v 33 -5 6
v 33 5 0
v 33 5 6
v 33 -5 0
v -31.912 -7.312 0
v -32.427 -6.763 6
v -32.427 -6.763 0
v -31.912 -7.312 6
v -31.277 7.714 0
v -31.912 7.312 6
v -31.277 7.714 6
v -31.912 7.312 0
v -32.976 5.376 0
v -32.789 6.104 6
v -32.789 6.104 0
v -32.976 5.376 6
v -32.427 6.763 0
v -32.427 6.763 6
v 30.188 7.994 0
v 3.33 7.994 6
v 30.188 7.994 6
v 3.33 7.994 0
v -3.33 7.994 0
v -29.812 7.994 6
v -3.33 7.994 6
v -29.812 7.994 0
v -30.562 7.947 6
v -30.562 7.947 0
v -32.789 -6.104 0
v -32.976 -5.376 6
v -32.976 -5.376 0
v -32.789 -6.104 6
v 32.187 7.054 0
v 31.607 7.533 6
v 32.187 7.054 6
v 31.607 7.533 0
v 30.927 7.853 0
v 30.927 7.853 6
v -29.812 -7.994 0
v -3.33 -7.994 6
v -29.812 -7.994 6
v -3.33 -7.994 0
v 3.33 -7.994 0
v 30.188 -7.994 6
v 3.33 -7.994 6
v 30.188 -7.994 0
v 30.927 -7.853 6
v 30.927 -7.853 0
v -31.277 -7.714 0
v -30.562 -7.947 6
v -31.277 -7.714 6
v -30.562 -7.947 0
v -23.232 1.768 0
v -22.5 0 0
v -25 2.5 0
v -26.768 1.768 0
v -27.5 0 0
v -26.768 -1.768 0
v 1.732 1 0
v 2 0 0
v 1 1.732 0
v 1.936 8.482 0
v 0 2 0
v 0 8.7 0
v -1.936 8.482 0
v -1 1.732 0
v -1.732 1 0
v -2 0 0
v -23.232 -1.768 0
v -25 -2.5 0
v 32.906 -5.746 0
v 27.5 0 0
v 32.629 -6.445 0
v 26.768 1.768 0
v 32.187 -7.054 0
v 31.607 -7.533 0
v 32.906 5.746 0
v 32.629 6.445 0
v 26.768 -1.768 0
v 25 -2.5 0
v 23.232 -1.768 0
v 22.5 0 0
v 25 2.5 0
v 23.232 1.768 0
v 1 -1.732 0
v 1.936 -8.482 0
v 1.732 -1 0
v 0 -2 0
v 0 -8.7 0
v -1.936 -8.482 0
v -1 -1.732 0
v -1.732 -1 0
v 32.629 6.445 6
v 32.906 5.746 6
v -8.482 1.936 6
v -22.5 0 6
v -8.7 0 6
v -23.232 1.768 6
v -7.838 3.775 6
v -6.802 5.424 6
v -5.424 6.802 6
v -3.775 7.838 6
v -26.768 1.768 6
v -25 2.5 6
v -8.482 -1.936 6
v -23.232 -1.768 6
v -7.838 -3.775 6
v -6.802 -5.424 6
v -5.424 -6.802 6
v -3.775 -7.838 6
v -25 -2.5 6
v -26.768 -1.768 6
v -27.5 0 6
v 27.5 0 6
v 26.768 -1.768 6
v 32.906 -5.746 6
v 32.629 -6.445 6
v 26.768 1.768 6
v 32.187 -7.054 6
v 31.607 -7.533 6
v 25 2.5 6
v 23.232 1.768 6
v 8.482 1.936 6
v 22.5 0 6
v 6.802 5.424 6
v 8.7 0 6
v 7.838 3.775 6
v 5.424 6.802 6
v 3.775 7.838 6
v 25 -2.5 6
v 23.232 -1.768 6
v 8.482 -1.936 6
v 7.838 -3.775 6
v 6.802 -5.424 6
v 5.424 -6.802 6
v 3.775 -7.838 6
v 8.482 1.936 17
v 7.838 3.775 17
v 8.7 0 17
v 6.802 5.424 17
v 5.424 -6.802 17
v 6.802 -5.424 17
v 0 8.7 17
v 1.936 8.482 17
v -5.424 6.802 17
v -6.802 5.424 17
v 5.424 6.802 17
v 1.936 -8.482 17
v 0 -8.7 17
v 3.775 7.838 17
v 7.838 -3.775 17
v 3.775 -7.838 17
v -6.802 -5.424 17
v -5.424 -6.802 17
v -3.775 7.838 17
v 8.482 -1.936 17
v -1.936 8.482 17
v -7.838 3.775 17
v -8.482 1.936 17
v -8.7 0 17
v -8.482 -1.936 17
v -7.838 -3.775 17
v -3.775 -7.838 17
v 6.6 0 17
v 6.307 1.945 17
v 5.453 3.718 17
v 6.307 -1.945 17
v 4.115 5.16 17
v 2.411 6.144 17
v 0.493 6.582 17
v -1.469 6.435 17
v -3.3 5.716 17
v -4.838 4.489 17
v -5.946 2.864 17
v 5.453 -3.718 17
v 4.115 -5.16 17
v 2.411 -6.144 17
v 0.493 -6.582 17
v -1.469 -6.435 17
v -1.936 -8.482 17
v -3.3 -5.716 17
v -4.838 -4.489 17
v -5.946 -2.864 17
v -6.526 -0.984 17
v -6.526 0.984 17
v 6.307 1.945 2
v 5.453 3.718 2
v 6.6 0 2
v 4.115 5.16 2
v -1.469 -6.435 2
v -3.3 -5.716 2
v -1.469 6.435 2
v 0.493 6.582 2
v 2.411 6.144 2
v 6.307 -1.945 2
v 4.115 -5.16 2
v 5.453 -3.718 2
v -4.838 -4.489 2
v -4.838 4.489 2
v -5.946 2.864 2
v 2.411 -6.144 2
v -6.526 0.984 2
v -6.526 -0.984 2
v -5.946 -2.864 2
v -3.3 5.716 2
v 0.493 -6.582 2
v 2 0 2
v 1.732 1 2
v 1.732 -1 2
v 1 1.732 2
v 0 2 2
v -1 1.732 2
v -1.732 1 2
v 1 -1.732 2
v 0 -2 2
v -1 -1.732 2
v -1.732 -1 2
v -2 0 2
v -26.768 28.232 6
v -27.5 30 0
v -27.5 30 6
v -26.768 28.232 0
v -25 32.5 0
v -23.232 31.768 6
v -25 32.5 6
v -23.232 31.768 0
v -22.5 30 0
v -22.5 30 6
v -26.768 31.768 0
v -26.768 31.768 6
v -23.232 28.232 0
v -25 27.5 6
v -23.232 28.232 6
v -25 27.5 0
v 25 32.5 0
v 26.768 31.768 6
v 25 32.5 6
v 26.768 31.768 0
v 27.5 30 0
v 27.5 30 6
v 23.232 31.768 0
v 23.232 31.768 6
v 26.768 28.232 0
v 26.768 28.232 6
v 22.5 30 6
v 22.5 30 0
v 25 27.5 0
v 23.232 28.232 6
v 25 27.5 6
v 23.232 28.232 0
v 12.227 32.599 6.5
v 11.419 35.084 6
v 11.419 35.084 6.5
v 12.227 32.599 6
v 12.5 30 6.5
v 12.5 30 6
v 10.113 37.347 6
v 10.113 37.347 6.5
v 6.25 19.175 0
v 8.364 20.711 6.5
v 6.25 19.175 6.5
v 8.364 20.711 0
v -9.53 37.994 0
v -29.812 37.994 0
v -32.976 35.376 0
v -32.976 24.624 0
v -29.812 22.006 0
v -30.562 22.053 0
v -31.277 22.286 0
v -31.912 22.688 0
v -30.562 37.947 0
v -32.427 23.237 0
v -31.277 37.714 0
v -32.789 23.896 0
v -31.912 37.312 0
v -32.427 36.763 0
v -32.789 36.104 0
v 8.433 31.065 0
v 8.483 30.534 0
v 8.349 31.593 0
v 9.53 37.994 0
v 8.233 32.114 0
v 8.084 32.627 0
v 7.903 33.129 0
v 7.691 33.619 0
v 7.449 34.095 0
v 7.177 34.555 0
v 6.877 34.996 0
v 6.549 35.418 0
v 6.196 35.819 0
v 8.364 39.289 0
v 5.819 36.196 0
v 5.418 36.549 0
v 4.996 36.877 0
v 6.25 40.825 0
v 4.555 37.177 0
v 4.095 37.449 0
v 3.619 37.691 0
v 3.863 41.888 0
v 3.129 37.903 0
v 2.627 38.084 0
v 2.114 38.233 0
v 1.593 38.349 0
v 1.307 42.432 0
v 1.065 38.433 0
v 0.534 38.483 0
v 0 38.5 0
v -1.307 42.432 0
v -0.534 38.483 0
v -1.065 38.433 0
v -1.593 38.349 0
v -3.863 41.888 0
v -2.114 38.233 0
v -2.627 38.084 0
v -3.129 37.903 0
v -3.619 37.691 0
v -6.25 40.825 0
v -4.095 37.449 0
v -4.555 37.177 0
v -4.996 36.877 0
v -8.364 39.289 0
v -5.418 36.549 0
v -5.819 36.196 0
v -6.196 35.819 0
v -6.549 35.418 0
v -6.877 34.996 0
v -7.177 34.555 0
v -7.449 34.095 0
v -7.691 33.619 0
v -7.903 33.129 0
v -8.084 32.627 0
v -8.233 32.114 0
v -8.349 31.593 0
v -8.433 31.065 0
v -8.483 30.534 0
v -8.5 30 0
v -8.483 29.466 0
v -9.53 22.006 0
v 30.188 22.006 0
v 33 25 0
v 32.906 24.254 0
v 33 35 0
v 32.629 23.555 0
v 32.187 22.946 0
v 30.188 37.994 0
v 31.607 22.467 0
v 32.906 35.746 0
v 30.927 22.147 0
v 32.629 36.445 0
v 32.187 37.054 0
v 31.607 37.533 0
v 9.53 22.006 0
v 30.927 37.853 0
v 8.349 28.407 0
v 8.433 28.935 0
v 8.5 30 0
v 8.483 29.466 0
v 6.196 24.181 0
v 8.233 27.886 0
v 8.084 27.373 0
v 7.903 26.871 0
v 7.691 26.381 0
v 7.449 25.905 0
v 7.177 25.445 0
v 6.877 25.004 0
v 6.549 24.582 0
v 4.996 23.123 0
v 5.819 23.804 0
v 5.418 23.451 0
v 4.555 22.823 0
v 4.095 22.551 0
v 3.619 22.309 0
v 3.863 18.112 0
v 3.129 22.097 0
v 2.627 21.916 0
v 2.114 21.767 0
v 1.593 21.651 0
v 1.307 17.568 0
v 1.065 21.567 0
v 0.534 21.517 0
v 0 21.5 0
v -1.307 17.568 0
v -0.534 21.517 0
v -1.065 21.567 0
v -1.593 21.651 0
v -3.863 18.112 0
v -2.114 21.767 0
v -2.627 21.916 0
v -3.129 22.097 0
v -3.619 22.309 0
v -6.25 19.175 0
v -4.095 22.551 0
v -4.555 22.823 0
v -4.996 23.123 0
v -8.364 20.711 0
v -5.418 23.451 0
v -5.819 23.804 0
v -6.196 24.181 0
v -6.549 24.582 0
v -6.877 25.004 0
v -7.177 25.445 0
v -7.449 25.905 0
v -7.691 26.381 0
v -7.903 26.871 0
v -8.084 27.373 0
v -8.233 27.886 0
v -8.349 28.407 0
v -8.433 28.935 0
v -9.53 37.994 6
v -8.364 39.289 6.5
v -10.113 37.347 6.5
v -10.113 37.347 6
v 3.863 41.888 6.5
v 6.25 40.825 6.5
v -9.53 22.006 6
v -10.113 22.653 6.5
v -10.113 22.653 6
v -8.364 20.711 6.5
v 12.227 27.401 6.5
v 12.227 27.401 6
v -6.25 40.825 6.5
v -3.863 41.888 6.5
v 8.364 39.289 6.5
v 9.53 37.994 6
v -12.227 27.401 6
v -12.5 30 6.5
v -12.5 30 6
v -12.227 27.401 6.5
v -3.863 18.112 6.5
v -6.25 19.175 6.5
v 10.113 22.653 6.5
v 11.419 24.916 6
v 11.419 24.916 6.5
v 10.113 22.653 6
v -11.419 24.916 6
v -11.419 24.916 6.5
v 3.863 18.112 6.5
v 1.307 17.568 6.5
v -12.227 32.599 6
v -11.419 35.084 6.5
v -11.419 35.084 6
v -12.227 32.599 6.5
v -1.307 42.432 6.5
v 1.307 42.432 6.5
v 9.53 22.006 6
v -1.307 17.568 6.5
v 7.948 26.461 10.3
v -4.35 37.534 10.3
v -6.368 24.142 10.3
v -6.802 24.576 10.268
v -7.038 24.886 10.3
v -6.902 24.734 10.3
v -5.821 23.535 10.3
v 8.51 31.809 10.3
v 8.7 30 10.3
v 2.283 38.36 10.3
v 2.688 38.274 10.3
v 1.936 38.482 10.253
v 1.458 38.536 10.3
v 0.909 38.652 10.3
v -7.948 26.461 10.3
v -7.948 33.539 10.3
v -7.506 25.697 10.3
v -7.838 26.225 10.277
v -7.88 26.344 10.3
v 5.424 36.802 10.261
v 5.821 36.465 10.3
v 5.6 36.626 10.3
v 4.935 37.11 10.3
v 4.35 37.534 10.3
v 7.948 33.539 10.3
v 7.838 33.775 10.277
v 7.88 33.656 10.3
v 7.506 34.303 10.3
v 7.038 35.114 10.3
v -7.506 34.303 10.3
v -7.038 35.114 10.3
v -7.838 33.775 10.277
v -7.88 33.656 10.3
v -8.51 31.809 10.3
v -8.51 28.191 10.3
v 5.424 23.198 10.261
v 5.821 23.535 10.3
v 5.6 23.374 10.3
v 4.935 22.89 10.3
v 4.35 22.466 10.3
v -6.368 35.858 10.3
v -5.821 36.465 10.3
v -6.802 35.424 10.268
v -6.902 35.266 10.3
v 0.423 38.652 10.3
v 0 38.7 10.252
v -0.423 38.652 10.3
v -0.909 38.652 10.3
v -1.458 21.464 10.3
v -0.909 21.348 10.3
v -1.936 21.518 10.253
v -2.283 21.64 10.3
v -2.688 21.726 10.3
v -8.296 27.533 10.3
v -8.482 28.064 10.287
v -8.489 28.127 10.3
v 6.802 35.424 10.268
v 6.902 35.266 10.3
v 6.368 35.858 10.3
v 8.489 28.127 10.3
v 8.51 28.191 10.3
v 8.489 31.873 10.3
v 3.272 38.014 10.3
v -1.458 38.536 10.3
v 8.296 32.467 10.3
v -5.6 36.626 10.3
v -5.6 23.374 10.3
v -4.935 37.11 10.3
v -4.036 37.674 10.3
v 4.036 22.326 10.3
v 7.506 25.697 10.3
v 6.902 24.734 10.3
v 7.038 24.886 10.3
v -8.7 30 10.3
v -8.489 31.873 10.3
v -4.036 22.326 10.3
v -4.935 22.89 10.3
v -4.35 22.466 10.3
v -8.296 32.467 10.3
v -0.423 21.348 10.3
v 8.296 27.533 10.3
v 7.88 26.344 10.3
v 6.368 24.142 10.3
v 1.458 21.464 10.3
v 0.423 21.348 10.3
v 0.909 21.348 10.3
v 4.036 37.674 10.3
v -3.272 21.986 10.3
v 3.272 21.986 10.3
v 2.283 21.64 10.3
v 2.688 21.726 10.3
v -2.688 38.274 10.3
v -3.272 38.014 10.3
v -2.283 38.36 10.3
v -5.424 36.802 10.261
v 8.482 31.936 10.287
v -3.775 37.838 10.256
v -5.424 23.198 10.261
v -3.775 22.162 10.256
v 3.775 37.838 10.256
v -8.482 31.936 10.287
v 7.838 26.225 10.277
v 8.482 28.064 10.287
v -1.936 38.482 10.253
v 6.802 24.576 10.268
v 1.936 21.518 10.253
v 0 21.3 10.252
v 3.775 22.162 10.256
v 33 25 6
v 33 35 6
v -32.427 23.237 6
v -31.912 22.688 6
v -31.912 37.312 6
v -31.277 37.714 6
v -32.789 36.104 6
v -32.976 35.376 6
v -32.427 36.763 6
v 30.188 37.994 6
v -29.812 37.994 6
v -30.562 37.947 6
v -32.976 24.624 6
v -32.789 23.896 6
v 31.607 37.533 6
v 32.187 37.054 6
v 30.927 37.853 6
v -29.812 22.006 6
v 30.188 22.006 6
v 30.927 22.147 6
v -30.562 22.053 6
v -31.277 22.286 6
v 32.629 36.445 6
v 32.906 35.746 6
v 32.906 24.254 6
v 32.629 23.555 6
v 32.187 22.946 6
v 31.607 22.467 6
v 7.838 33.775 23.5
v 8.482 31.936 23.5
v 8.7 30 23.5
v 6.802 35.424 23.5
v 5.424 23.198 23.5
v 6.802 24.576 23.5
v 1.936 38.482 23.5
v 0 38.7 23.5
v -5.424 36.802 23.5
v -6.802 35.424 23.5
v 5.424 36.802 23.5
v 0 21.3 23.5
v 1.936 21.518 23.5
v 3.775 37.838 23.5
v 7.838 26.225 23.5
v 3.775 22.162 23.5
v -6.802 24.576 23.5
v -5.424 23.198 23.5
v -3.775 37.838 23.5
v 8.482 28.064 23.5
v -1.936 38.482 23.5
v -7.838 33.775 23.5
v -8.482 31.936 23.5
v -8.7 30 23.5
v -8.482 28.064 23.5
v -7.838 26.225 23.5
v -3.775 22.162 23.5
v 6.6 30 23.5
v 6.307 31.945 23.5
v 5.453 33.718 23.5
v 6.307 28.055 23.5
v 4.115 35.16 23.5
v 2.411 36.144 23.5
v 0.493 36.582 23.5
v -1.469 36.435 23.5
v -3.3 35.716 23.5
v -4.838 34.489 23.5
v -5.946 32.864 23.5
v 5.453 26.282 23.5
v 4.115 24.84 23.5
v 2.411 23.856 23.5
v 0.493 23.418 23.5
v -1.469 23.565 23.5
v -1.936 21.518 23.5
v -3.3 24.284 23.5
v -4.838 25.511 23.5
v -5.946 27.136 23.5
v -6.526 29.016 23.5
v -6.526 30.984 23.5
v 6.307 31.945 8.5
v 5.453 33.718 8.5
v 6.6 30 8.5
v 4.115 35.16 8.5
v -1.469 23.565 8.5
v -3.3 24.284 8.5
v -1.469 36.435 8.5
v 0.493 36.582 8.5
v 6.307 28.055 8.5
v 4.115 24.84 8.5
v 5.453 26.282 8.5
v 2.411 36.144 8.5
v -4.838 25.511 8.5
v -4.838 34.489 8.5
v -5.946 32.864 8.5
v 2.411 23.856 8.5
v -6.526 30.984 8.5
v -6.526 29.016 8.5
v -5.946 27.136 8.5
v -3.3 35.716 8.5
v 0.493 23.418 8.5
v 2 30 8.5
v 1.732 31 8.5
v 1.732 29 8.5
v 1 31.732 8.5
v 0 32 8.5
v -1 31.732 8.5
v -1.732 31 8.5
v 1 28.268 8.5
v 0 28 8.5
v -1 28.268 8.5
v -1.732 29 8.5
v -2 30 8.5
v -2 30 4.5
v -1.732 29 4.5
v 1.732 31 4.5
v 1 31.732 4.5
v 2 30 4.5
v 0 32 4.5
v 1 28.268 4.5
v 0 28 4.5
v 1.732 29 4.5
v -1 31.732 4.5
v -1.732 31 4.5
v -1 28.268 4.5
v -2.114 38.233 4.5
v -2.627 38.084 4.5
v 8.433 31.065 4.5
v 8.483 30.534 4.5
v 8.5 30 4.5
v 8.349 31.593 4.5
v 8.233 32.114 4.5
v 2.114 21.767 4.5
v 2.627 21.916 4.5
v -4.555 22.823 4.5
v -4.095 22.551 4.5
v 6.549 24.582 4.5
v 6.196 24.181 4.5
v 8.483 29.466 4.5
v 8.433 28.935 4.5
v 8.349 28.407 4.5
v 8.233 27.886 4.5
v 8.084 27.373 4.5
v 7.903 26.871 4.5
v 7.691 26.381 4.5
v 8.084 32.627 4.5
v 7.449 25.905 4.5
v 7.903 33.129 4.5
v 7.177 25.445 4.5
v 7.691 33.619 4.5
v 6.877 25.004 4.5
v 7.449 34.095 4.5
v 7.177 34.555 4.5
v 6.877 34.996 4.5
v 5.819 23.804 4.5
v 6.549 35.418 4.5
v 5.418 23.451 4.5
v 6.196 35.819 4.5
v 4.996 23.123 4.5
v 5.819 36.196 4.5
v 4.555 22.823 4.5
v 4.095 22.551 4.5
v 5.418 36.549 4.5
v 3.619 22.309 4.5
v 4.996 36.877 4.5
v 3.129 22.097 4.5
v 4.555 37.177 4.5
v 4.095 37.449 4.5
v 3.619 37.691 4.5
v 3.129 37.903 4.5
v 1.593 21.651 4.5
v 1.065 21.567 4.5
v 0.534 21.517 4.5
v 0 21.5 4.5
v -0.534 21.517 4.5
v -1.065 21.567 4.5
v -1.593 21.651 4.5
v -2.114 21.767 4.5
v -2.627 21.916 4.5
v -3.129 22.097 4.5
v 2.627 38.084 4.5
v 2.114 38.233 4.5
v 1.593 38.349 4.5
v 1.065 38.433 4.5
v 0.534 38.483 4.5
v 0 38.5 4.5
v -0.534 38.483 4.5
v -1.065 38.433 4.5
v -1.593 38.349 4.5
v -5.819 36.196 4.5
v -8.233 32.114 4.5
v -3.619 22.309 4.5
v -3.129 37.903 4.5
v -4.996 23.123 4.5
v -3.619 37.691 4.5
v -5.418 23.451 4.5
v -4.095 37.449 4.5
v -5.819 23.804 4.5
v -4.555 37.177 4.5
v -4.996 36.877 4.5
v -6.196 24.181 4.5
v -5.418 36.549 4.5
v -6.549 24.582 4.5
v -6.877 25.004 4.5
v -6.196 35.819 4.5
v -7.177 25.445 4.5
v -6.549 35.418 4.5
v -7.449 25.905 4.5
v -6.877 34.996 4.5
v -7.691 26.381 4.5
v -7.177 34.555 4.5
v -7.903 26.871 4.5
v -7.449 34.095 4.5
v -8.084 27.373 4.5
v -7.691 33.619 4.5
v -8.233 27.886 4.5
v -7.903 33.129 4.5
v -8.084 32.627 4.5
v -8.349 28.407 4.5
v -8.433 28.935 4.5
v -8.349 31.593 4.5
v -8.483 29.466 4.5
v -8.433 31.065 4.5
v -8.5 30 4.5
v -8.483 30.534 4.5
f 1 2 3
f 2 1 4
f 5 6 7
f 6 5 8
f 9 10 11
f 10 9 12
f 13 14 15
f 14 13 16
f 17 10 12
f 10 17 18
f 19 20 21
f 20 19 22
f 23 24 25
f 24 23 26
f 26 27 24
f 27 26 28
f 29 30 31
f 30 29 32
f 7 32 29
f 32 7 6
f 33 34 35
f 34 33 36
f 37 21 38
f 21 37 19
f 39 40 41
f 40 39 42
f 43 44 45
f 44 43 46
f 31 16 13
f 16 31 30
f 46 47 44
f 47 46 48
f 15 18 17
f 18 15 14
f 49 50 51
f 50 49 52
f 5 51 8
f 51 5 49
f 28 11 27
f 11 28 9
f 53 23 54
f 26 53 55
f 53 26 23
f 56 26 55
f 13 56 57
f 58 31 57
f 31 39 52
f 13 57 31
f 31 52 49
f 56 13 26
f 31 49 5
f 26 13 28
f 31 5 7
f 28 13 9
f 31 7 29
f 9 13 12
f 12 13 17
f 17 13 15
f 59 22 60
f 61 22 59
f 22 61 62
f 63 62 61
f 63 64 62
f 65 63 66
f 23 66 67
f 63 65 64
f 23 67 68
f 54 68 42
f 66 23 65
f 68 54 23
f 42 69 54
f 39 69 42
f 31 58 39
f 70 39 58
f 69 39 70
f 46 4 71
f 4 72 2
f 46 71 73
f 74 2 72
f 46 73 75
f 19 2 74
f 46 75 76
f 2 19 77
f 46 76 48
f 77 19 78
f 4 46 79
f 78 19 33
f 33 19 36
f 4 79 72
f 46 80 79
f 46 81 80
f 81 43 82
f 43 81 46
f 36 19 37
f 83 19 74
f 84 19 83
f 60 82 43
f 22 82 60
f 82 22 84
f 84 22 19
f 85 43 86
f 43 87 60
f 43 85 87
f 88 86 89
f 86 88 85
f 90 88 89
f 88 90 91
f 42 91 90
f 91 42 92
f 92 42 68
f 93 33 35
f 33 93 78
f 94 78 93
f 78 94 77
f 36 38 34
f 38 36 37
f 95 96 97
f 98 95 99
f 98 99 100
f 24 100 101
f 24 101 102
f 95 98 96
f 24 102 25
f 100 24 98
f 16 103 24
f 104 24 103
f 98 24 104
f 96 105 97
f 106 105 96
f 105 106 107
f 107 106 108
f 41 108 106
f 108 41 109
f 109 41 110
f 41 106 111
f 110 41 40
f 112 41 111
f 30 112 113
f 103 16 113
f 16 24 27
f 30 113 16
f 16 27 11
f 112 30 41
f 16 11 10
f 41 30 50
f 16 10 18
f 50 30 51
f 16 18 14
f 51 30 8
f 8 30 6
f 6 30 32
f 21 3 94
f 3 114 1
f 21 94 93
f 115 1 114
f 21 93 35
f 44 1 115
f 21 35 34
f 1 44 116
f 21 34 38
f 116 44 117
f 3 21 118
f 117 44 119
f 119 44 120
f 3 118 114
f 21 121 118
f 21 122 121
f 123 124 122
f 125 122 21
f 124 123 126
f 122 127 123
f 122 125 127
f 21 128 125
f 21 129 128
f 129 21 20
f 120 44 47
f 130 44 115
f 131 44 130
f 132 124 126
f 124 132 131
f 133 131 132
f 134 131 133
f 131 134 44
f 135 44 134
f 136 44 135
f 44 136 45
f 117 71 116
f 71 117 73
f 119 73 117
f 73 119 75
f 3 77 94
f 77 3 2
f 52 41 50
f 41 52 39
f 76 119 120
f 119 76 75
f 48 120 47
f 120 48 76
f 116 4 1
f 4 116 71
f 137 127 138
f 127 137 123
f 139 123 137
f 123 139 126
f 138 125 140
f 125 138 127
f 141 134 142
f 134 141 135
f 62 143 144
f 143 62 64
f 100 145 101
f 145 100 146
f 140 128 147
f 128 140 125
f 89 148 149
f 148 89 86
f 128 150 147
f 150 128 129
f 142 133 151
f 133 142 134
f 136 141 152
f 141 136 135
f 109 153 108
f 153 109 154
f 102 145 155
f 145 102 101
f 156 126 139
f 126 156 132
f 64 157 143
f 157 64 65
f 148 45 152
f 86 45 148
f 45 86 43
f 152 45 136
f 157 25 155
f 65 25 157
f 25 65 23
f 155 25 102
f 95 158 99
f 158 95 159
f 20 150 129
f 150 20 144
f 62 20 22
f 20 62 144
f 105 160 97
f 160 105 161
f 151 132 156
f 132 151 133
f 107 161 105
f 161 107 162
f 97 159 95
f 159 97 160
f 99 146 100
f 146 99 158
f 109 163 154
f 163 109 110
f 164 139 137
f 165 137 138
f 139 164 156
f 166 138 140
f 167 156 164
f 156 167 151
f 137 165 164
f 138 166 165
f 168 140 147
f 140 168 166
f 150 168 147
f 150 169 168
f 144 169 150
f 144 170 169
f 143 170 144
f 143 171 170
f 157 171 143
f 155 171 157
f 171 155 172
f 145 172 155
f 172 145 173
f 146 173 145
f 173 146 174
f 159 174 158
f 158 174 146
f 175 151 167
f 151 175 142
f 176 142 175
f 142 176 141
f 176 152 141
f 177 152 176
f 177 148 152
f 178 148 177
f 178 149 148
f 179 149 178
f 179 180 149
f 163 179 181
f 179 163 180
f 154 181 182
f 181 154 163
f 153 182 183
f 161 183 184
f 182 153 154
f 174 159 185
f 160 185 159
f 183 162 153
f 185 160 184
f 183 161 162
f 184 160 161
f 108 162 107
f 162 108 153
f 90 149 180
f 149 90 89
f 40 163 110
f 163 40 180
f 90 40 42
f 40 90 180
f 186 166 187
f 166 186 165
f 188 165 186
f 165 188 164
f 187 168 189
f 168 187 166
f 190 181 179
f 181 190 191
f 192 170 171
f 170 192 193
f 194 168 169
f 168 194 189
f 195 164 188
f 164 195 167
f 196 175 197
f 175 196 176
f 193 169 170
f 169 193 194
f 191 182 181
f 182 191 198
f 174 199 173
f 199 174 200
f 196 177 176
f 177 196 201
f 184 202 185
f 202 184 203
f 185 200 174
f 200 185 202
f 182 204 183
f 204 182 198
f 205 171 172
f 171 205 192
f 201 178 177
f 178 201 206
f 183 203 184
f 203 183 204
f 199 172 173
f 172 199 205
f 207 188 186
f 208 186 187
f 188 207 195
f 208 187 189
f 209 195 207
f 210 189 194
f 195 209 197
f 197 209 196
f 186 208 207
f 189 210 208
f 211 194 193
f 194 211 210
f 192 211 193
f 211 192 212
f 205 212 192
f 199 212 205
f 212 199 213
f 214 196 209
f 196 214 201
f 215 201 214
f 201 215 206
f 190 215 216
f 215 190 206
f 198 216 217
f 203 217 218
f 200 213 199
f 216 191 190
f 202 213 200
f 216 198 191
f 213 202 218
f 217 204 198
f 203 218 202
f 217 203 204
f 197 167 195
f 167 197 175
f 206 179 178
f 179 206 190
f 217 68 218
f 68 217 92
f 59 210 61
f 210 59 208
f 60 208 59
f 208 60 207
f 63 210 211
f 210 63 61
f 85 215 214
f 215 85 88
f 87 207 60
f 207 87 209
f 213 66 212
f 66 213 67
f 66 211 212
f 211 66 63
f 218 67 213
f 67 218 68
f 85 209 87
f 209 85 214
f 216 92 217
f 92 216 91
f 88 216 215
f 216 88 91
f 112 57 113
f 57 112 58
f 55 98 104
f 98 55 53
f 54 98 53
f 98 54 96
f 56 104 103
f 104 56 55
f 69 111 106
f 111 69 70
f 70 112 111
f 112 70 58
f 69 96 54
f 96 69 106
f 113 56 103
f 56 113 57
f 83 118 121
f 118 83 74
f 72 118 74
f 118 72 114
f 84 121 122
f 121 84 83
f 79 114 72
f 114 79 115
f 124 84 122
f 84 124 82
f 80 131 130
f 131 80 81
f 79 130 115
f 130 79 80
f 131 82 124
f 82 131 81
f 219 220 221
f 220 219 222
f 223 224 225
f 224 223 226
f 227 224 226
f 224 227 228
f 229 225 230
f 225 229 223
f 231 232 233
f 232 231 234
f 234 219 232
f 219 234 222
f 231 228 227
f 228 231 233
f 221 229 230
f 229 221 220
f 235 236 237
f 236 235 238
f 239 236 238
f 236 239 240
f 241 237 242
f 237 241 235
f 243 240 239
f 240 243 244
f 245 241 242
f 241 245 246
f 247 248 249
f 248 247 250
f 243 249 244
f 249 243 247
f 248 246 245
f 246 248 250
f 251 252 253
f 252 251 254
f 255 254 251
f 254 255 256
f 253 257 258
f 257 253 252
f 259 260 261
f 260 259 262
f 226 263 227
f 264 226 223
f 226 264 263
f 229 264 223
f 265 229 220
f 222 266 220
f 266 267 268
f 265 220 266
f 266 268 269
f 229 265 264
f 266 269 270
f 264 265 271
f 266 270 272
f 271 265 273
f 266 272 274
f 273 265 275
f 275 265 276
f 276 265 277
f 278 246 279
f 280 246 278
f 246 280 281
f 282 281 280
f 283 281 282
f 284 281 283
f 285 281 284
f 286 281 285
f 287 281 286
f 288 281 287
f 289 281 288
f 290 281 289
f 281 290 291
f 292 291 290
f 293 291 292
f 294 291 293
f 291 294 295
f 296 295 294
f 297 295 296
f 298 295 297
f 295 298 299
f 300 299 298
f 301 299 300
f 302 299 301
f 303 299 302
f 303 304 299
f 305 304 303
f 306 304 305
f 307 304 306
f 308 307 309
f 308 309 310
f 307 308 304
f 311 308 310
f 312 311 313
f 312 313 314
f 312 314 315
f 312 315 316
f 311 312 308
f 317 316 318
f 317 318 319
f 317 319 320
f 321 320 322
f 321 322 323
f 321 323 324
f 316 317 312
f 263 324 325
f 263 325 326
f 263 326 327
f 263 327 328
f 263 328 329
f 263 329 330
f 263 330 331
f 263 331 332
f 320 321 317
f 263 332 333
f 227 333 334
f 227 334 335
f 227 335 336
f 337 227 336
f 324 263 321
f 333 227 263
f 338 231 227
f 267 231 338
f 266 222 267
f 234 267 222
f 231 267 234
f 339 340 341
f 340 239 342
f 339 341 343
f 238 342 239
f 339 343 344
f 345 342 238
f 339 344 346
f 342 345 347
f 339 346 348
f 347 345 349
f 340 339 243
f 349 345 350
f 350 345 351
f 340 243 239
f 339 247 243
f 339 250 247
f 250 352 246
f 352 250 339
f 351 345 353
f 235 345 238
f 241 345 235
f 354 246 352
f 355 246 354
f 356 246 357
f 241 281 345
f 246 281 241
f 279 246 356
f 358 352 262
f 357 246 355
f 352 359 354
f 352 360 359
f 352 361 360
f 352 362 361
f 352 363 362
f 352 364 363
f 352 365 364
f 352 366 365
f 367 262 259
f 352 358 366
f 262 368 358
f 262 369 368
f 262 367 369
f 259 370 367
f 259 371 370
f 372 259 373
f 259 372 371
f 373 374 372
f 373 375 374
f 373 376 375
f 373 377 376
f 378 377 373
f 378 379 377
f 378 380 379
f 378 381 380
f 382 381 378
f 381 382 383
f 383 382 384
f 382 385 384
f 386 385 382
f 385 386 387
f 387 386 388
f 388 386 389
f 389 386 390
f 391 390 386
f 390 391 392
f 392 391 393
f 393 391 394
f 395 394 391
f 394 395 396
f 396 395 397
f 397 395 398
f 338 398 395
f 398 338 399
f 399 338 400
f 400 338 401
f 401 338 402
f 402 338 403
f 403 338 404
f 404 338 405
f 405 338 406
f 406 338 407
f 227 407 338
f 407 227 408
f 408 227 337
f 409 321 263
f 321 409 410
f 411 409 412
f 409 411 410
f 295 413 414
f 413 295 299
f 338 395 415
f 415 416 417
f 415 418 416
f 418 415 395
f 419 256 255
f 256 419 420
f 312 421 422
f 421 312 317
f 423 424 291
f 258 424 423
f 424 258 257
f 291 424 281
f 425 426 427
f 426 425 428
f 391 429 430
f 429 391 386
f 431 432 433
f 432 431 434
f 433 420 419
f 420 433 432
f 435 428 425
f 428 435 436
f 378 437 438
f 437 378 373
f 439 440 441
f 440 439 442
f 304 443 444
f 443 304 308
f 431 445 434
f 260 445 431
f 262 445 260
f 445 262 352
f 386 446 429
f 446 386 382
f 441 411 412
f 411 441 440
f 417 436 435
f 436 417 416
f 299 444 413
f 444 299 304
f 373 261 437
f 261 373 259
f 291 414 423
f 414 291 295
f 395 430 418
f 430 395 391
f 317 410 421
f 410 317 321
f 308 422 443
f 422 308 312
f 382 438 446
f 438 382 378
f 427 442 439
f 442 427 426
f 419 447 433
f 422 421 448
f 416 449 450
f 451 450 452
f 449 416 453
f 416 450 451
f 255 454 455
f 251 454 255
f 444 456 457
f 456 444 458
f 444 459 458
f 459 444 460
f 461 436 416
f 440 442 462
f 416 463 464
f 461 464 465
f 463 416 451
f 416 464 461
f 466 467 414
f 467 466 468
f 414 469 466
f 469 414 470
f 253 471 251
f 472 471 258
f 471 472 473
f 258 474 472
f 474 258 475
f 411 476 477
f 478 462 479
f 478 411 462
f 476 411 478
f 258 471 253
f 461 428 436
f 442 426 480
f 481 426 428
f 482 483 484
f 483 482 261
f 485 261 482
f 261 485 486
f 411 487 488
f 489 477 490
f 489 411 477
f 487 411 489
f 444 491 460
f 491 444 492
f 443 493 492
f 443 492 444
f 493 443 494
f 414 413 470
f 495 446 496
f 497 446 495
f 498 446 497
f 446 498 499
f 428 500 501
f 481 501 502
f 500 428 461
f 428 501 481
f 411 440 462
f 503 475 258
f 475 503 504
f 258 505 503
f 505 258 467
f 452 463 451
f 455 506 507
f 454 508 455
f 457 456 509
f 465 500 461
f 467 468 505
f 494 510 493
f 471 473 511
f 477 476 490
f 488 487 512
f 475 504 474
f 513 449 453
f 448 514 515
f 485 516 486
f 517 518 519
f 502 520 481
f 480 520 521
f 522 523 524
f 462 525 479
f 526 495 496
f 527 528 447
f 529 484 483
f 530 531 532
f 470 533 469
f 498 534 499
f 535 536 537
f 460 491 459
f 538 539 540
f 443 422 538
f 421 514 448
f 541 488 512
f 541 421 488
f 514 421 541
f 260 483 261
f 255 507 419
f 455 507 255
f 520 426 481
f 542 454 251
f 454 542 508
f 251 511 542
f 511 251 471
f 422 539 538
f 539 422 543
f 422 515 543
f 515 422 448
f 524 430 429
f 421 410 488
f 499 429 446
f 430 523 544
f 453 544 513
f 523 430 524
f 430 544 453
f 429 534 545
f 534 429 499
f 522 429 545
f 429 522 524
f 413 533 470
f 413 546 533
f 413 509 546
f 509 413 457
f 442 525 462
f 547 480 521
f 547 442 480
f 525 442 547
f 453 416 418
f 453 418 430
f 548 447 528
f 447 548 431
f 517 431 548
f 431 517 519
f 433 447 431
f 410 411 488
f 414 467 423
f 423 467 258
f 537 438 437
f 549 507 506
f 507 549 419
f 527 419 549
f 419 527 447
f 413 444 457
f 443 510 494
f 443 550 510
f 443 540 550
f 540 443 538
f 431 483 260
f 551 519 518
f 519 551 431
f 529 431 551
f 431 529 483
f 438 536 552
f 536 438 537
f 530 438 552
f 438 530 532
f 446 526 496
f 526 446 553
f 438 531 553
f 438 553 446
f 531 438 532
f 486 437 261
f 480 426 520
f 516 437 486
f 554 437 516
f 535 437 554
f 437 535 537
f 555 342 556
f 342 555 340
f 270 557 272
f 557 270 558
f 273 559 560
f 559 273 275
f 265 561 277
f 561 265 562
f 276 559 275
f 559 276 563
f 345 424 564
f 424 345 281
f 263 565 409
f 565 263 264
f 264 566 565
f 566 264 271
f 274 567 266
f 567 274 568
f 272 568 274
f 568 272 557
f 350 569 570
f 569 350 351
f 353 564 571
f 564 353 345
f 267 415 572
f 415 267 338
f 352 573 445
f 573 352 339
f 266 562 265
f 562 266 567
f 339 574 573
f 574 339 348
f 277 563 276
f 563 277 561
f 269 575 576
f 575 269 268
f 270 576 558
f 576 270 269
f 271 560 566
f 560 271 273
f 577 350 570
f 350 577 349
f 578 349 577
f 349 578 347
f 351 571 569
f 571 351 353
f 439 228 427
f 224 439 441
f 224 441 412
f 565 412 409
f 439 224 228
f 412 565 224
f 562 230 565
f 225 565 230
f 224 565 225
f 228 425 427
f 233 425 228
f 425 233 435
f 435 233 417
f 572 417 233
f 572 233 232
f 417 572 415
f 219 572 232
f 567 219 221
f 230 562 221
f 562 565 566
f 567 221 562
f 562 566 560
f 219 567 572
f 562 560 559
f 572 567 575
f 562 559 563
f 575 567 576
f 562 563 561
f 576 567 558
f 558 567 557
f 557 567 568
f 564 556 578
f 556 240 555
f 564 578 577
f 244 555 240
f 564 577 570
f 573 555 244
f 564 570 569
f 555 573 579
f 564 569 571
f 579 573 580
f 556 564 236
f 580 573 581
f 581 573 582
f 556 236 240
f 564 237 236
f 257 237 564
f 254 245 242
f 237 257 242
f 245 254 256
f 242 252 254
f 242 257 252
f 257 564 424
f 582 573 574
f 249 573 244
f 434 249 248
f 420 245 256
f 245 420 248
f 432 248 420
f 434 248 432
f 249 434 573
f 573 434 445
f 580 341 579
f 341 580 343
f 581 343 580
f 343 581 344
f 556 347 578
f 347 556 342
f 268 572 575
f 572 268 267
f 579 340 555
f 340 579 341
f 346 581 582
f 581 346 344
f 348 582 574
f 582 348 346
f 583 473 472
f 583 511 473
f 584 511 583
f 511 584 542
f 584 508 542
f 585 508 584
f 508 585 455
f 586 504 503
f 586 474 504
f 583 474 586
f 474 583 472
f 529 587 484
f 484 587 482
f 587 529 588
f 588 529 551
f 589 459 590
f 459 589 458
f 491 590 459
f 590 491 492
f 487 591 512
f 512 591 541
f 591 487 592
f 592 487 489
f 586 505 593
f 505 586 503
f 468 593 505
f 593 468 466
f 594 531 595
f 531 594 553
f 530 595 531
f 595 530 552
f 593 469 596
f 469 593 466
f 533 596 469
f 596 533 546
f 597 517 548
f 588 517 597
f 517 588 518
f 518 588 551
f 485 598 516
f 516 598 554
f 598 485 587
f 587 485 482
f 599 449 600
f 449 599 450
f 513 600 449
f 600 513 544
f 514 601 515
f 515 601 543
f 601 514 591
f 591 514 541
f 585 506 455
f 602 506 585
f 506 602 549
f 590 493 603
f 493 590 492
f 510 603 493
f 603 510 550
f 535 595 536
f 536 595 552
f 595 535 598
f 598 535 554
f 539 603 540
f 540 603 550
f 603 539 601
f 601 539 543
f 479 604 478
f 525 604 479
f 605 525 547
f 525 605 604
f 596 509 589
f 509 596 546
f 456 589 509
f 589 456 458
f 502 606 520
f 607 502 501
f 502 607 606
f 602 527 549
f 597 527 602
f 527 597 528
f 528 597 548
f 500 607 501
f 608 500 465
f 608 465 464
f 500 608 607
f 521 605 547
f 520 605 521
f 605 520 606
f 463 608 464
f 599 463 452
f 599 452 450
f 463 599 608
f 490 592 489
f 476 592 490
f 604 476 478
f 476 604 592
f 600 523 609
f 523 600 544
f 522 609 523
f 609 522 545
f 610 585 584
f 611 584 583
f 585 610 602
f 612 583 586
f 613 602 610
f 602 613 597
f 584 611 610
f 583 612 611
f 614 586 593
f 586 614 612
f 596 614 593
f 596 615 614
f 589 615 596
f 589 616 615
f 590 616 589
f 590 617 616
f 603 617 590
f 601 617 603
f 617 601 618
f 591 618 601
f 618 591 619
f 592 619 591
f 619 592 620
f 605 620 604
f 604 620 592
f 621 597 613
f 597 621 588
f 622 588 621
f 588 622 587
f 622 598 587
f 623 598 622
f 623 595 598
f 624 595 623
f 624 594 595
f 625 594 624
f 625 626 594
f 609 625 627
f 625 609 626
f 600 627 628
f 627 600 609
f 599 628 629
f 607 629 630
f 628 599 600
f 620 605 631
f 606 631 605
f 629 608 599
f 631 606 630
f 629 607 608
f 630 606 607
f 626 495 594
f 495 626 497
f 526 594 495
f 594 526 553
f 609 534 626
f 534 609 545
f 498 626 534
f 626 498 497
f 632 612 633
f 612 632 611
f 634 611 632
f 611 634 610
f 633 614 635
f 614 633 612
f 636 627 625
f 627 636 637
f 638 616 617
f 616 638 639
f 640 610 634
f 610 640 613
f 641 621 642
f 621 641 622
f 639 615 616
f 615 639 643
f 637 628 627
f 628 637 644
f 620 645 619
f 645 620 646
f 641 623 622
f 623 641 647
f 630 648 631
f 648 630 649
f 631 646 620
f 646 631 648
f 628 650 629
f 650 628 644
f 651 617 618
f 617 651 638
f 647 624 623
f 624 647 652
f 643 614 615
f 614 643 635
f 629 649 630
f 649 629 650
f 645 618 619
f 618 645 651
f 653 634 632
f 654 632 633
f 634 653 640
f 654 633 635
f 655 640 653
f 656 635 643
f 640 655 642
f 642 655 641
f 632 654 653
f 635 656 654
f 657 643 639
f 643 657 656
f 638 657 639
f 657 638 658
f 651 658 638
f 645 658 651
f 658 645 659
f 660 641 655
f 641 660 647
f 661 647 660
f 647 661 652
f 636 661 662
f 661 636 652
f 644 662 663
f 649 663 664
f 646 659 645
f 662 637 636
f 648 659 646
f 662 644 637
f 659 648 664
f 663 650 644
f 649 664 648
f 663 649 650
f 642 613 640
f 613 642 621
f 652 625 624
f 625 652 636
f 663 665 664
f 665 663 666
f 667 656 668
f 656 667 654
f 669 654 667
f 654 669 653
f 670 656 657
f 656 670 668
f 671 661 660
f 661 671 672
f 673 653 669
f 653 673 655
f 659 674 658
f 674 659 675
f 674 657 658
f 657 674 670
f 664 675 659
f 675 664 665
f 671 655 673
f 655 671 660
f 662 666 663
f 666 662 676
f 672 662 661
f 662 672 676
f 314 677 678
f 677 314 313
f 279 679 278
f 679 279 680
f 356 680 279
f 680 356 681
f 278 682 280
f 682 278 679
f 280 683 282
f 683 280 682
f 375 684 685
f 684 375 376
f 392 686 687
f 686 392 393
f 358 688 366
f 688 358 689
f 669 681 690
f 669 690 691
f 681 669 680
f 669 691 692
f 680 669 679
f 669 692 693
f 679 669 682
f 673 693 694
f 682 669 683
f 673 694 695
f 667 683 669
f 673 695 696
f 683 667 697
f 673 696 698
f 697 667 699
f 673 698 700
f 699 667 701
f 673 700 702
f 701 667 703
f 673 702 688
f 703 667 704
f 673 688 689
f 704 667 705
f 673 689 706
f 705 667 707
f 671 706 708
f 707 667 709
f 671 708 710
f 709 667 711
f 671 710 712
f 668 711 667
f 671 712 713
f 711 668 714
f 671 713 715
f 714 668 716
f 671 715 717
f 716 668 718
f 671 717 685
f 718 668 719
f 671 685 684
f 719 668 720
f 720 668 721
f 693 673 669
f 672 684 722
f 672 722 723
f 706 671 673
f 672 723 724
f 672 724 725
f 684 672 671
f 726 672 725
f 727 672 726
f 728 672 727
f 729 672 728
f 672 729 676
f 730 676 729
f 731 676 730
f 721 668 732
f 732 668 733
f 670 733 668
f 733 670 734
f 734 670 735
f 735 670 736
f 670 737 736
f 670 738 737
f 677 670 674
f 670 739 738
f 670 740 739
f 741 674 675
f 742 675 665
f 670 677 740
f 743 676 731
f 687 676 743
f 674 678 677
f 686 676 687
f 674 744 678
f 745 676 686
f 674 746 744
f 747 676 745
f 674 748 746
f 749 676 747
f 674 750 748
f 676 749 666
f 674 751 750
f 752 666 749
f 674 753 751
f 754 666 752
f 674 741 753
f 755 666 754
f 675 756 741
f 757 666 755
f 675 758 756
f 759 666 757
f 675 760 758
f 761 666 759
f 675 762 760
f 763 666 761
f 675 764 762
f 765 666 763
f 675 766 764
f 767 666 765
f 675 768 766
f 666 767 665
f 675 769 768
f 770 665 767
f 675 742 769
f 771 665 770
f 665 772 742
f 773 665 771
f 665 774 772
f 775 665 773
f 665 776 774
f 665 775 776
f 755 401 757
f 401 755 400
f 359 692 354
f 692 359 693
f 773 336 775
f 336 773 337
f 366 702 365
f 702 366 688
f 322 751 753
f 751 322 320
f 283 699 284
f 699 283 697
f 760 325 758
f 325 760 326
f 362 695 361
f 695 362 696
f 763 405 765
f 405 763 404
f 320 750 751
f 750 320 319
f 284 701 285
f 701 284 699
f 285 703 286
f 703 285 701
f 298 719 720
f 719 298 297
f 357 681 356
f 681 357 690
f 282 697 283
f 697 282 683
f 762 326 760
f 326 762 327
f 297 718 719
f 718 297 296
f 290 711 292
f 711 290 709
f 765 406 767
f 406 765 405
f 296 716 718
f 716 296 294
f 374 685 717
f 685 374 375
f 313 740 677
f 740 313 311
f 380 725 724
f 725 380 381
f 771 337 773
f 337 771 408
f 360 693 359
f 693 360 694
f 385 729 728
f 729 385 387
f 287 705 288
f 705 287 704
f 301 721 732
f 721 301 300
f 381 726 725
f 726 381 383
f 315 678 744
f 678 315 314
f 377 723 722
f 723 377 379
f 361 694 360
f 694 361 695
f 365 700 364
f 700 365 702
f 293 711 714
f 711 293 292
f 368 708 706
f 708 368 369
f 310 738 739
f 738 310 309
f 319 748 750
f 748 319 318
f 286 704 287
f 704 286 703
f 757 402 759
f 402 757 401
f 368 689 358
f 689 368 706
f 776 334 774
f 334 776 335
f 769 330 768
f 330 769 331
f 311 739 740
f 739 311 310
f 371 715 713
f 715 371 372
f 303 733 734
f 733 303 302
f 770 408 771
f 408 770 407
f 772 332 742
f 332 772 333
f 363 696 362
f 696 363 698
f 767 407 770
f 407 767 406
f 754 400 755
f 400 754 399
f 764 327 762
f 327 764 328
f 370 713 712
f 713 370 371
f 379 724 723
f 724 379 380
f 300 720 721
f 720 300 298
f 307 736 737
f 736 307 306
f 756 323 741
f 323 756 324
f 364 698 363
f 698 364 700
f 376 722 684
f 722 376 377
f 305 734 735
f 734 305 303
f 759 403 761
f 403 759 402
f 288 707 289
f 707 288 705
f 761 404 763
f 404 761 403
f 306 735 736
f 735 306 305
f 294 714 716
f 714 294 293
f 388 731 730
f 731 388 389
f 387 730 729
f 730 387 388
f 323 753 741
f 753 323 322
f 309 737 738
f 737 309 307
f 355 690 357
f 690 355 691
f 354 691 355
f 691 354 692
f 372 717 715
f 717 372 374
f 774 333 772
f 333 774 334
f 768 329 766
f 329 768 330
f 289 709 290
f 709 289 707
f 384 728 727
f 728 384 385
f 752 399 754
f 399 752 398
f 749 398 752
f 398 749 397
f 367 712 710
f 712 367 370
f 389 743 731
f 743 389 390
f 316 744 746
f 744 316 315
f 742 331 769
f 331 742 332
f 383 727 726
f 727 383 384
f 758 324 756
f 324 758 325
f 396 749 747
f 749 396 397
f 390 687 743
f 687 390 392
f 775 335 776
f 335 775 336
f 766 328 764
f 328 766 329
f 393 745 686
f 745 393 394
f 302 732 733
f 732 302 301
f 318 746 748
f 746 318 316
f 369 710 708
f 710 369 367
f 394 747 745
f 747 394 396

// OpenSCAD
gInnerGuide = 19;  // distance from top of hotend hole to bottom of bearings
gMountRad = 17/2;  // normally 16 for J-Head
gBoltSpacing = 25;  // each from center

gExtruderInset = 11;  // Bottom of extruder to top of hotend hole
gHotendInset = 4.5;  // Size of J-Head above lasercut part
gHotendGuide = 6;  // Top of J-Head to top of PTFE liner (where hollow setscrew is)

gMountsThick = 6;
gMountsWide = 10;
gHalfWidth = gMountsWide / 2;

// For McMaster 51055K972 (1/4" NPTF)
// slightly less than the screw thread on coupler
gScrewableInnerRad = 6.5+0.1;
// outer-inner=wall
gScrewableOuterRad = gScrewableInnerRad + 2.1;

gInnerTubeRadClearance = 2; // If using a 2-part liner, size of hole to let inner through

// TODO single layer bridging at bottom of gap
// TODO optional trap nuts on hotend side
// TODO tighten up mounting holes (they're loose on M4)
// TODO extend depth of screwable part (seems to bottom out about 1mm shy)

module PushFitting(screwDepth=14, screwRad=6.75, hexTall=6.3, hexShort=17.18/2, roundTall=3.3, roundRad=16.64/2,
    secondRad=14.5/2, secondTall=2, thirdRad=10/2, thirdTall=1.5) {
  difference() {
    union() {
      cylinder(r=hexShort/cos(30), h=hexTall, $fn=6);
      cylinder(r=roundRad, roundTall+hexTall, $fn=100);
      cylinder(r=secondRad, roundTall+hexTall+secondTall);
      cylinder(r=thirdRad, roundTall+hexTall+secondTall+thirdTall);
      translate([0,0,-screwDepth])
        cylinder(r=screwRad, h=screwDepth+1, $fn=100);
    }
    translate([0,0,-50]) cylinder(r=6.3/2, h=100);
  }
}

module CenteredRoundedCube(xyz, r=3) {
  hull() {
    for(x_scale=[-1,1])
      for(y_scale=[-1,1])
        translate([xyz[0]/2*x_scale, xyz[1]/2*y_scale, 0])
          cylinder(r=r, h=xyz[2]);
  }
}

module ExtruderMount(outerRad=false, zOffset=0) {
  difference() {
    union() {
      CenteredRoundedCube([gBoltSpacing*2+gHalfWidth*2, gMountsWide, gMountsThick], $fn=25);
      cylinder(r=gScrewableOuterRad, h=17+zOffset); // 1mm more than usual
      if(zOffset > 0) {
        cylinder(r=outerRad, h=zOffset);
        translate([0,0,zOffset])
          cylinder(r1=outerRad, r2=gScrewableOuterRad, h=outerRad-gScrewableOuterRad);
      }
    }
    translate([0,0,zOffset]) {
      translate([0,0,2]) cylinder(r=gScrewableInnerRad, h=15.1);
      translate([0,0,-50]) cylinder(r=gInnerTubeRadClearance, h=100, $fn=12);
    }
    for(x_scale=[-1,1])
      translate([gBoltSpacing*x_scale, 0, -1])
        cylinder(r=5/2, h=100);
  }
}

module HotendMount() {
  difference() {
    ExtruderMount(outerRad=gMountRad+4, zOffset=gHotendInset+2);
    translate([0,0,-1]) cylinder(r=gMountRad, h=gHotendInset+1, $fn=100);
  }
}

ExtruderMount();
translate([0,30,0]) HotendMount();
